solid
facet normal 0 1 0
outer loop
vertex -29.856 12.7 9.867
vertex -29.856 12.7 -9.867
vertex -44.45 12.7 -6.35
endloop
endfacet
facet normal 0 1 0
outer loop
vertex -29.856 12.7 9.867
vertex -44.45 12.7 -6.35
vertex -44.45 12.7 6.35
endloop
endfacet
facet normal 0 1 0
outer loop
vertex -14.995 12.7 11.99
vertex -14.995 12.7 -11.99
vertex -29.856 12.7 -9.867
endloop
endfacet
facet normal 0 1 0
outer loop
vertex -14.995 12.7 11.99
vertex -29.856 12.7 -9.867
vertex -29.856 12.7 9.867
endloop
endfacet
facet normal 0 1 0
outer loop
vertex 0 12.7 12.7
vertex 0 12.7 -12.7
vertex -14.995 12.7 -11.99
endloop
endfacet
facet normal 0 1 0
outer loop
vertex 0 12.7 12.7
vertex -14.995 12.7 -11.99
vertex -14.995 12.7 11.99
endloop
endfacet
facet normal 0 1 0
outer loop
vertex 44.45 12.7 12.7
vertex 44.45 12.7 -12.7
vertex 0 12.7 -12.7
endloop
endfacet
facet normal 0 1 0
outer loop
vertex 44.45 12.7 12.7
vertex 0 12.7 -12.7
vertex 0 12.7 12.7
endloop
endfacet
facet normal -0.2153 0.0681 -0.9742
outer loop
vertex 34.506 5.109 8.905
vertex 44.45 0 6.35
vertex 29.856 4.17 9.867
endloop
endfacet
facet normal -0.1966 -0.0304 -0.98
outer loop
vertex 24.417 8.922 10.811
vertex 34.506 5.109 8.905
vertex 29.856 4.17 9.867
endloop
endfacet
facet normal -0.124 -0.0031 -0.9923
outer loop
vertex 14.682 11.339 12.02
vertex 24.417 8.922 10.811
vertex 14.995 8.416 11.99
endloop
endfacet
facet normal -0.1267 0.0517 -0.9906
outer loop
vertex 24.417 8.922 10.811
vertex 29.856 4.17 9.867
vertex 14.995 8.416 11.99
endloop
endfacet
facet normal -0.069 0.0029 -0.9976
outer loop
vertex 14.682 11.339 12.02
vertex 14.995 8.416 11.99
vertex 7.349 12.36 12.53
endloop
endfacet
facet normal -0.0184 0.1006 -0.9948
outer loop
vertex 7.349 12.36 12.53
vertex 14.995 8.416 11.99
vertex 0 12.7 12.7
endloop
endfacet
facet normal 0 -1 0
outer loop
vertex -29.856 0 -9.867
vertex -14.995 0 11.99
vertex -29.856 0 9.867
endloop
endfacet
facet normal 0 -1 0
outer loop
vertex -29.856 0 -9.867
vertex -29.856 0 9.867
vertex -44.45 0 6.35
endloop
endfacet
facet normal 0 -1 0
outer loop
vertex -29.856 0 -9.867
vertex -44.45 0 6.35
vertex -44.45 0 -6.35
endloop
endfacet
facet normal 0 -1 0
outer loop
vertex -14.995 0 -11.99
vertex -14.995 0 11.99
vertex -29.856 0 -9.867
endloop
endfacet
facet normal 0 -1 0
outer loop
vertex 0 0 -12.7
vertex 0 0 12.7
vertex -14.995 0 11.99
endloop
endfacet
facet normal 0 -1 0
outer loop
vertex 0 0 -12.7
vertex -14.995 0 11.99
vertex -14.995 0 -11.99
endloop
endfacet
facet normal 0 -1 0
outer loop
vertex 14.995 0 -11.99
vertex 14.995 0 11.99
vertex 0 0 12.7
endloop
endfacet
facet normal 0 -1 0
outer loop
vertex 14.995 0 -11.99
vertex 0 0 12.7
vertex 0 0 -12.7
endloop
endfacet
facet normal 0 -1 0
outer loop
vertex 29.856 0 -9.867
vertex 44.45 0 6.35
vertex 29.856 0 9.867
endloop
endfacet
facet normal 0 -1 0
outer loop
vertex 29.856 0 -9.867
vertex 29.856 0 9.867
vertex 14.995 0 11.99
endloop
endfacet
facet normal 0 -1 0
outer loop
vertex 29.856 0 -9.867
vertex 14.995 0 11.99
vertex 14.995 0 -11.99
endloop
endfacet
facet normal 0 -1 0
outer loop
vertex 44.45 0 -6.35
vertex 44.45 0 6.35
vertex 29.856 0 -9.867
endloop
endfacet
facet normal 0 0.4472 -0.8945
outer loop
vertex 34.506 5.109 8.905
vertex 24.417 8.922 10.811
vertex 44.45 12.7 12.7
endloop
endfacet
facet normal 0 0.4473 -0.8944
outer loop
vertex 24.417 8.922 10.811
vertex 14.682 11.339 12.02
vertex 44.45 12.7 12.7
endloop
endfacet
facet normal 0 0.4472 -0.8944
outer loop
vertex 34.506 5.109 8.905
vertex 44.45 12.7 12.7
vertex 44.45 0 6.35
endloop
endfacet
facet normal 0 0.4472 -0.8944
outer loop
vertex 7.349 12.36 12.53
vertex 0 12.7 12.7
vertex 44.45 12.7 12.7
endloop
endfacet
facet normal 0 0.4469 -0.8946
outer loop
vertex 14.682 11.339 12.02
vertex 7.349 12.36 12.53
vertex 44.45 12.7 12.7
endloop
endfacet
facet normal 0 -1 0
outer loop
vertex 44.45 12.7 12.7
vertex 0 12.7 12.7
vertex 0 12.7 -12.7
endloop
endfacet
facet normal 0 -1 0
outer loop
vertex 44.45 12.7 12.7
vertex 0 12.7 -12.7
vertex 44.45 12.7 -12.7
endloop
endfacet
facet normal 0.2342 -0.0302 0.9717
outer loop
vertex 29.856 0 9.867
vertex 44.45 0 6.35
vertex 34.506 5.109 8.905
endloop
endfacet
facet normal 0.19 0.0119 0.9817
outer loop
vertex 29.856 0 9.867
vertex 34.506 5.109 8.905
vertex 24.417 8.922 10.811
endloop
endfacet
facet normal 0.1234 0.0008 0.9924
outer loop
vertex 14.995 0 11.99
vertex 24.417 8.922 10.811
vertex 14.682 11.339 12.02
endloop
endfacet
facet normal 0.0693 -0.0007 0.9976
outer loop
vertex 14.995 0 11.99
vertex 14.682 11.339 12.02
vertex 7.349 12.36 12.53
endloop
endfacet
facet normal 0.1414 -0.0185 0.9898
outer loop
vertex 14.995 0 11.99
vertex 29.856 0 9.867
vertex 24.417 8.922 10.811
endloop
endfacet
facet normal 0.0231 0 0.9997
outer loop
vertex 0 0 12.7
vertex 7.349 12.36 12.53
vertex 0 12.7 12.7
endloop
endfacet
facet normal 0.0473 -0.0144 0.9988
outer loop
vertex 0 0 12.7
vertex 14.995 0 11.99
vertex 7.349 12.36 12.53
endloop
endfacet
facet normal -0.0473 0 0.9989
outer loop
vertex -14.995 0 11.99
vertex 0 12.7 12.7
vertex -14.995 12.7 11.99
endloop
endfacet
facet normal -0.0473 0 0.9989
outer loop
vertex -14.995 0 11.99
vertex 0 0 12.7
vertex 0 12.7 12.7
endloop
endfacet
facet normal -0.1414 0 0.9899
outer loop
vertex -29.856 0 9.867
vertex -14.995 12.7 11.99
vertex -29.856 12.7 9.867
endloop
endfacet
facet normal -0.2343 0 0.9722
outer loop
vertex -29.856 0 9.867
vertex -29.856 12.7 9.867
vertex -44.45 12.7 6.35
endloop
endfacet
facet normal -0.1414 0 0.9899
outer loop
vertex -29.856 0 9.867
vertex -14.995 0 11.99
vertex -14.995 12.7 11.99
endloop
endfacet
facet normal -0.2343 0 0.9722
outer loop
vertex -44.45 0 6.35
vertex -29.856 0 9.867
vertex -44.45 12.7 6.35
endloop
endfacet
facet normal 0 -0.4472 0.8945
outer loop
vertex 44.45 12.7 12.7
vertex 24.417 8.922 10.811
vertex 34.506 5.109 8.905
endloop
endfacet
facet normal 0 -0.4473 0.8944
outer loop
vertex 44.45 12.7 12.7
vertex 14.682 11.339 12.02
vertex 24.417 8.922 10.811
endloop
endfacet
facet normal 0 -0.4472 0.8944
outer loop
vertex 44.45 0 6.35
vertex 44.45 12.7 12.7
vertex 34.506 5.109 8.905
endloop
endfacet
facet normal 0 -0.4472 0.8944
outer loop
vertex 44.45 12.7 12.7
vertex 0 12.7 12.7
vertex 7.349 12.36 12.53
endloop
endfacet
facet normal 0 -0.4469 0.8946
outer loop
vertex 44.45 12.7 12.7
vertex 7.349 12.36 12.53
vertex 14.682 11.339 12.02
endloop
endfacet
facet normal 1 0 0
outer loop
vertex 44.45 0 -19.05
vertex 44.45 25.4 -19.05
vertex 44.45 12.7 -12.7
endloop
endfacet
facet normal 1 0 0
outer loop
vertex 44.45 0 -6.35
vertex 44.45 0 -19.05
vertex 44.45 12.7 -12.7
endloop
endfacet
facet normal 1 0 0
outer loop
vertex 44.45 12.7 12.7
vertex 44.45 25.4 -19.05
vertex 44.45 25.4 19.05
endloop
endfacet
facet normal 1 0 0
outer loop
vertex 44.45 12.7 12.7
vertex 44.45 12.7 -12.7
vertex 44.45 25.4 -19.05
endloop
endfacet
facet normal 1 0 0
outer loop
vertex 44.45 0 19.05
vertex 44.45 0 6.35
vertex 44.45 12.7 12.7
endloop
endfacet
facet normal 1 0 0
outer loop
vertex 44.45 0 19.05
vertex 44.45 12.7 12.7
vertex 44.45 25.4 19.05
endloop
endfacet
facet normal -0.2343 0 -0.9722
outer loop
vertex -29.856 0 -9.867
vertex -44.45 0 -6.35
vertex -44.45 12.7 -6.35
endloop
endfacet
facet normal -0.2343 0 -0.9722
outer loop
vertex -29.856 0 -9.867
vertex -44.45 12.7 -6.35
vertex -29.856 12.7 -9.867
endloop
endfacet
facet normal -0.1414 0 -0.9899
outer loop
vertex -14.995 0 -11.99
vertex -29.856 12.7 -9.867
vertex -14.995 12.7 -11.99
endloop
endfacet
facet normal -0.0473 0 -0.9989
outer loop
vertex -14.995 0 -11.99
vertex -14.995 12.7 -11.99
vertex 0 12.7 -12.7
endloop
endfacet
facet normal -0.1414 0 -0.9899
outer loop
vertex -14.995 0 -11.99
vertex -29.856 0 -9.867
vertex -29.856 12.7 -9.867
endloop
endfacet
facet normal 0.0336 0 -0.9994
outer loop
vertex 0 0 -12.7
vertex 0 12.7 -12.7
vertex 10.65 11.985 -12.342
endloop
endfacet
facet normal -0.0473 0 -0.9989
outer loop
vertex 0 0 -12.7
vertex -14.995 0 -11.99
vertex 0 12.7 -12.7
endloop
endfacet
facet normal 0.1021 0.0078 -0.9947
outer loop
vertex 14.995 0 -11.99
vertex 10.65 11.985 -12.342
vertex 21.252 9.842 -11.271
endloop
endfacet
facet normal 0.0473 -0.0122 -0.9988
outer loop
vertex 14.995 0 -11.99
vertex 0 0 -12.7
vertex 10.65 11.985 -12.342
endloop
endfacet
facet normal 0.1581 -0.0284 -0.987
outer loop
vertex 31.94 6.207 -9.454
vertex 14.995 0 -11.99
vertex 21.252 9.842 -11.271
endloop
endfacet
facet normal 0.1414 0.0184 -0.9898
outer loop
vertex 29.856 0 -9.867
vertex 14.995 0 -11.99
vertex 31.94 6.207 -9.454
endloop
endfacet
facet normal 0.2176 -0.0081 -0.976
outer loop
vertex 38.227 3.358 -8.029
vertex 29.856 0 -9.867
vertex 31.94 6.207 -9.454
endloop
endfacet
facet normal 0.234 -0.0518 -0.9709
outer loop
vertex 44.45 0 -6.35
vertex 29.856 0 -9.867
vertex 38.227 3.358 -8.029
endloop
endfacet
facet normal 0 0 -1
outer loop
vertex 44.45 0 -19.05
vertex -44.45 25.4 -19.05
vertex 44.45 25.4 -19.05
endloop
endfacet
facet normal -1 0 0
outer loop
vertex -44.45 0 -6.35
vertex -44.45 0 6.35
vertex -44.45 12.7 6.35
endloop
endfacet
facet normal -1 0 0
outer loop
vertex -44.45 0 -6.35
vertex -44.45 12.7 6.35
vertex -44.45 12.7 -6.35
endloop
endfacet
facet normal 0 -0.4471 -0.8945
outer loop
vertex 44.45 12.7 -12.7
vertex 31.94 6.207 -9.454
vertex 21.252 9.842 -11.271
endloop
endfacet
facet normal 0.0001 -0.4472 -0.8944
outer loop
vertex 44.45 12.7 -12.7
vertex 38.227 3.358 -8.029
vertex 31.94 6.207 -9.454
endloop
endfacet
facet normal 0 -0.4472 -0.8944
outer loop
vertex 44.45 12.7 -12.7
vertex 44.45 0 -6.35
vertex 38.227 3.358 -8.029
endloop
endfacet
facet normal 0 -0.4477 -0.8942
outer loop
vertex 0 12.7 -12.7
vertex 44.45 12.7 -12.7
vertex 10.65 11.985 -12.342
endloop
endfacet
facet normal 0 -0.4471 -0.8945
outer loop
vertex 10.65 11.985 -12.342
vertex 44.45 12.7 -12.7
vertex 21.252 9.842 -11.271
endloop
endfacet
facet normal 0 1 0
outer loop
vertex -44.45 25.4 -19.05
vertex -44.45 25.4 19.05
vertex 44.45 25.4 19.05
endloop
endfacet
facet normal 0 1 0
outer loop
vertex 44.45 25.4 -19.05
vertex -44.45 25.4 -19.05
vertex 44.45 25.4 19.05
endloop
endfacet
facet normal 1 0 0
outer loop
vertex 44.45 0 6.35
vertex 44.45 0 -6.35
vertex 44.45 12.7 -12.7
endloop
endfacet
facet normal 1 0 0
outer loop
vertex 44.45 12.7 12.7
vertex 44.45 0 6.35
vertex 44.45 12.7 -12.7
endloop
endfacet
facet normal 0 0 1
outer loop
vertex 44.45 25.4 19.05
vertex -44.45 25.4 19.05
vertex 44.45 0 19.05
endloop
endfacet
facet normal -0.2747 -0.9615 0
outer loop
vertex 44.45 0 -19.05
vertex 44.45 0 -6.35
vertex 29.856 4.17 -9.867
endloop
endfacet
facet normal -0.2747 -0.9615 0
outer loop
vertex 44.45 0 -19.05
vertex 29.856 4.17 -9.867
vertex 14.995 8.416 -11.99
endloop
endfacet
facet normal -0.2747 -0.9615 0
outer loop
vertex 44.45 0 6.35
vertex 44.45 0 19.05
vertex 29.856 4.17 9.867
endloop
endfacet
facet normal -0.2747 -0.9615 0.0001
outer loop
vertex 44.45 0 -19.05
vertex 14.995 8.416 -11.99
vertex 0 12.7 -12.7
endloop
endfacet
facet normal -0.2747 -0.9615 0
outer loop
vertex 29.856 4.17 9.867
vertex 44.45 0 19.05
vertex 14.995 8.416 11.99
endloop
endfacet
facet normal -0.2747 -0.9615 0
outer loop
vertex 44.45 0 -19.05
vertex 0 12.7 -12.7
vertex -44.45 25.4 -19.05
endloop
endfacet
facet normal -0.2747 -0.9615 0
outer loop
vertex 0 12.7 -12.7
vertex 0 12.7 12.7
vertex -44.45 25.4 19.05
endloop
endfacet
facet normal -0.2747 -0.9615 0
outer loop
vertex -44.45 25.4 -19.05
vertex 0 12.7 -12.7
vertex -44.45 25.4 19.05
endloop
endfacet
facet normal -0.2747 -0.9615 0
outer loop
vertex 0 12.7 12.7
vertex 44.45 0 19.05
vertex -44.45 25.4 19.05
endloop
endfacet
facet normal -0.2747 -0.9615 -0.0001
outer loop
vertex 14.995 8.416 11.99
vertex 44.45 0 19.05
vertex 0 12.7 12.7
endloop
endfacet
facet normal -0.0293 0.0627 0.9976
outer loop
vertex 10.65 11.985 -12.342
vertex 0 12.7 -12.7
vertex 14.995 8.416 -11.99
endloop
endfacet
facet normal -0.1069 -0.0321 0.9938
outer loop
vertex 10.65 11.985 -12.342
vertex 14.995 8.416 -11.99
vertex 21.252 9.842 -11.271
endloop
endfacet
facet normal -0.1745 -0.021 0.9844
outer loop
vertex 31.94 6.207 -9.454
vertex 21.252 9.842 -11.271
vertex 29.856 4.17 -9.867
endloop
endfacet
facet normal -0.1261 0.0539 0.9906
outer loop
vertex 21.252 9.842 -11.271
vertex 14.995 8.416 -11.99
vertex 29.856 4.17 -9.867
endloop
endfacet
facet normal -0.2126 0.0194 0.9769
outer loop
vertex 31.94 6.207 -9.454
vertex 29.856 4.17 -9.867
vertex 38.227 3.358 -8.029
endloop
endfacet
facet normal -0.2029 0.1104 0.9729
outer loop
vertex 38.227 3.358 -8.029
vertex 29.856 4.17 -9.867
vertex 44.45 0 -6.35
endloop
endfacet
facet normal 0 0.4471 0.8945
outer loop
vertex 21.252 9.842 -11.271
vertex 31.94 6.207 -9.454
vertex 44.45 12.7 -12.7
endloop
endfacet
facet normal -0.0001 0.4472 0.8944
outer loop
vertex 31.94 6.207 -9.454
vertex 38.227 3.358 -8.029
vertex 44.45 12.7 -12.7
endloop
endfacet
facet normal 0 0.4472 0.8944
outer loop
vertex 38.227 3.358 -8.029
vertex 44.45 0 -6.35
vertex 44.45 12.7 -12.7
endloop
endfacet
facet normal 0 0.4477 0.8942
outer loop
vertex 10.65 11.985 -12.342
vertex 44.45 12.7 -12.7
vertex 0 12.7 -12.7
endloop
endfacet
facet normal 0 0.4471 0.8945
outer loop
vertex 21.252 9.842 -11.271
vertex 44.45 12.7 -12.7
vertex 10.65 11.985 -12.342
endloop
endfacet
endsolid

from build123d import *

# Parameters (mm, degrees)
F0_W          = 88.9
F0_H          = 38.1
F1_DEPTH      = 25.4
F3_DEPTH      = 12.7
F5_DEPTH      = 25.4
F5_DEPTH_BACK = 25.4
F7_DEPTH      = 50.8
F9_DEPTH      = 44.45
F10_DEPTH     = 12.7


with BuildPart() as f1:
    # F0 (on Front) → F1 (new body)
    with BuildSketch(Plane.XZ):
        Rectangle(F0_W, F0_H)
    extrude(amount=-F1_DEPTH)

    # F2 (on Front) → F3 (cut)
    with BuildSketch(Plane.XZ):
        with BuildLine():
            Line((44.45, -6.35), (44.45, 6.35))
            ThreePointArc((44.45, 6.35), (0, 12.7), (-44.45, 6.35))
            Line((-44.45, 6.35), (-44.45, -6.35))
            ThreePointArc((-44.45, -6.35), (0, -12.7), (44.45, -6.35))
        make_face()
    extrude(amount=-F3_DEPTH, mode=Mode.SUBTRACT)

    # F4 (on Top) → F5 (cut, two sides)
    with BuildSketch(Plane.XY) as f5_sk:
        Polygon((-44.45, 0), (44.45, 0), (-44.45, 25.4), align=None)
    extrude(amount=-F5_DEPTH, mode=Mode.SUBTRACT)
    extrude(f5_sk.sketch, amount=F5_DEPTH_BACK, mode=Mode.SUBTRACT)

    # F6 (on face) → F7 (cut)
    with BuildSketch(Plane.YZ.offset(44.45)):
        Polygon((12.7, 6.35), (12.7, 12.7), (0, 6.35), align=None)
        Polygon((12.7, -12.7), (12.7, -6.35), (0, -6.35), align=None)
    extrude(amount=-F7_DEPTH, mode=Mode.SUBTRACT)


with BuildPart() as f9:
    # F8 (on face) → F9 (new body)
    with BuildSketch(Plane.YZ.offset(44.45)):
        Polygon((12.7, -12.7), (12.7, 12.7), (0, 6.35), (0, -6.35), align=None)
    extrude(amount=-F9_DEPTH)

    # F2 (on Front) → F10 (join)
    with BuildSketch(Plane.XZ):
        with BuildLine():
            Line((44.45, -6.35), (44.45, 6.35))
            ThreePointArc((44.45, 6.35), (0, 12.7), (-44.45, 6.35))
            Line((-44.45, 6.35), (-44.45, -6.35))
            ThreePointArc((-44.45, -6.35), (0, -12.7), (44.45, -6.35))
        make_face()
    extrude(amount=-F10_DEPTH)


solid = Compound([f1.part, f9.part])
